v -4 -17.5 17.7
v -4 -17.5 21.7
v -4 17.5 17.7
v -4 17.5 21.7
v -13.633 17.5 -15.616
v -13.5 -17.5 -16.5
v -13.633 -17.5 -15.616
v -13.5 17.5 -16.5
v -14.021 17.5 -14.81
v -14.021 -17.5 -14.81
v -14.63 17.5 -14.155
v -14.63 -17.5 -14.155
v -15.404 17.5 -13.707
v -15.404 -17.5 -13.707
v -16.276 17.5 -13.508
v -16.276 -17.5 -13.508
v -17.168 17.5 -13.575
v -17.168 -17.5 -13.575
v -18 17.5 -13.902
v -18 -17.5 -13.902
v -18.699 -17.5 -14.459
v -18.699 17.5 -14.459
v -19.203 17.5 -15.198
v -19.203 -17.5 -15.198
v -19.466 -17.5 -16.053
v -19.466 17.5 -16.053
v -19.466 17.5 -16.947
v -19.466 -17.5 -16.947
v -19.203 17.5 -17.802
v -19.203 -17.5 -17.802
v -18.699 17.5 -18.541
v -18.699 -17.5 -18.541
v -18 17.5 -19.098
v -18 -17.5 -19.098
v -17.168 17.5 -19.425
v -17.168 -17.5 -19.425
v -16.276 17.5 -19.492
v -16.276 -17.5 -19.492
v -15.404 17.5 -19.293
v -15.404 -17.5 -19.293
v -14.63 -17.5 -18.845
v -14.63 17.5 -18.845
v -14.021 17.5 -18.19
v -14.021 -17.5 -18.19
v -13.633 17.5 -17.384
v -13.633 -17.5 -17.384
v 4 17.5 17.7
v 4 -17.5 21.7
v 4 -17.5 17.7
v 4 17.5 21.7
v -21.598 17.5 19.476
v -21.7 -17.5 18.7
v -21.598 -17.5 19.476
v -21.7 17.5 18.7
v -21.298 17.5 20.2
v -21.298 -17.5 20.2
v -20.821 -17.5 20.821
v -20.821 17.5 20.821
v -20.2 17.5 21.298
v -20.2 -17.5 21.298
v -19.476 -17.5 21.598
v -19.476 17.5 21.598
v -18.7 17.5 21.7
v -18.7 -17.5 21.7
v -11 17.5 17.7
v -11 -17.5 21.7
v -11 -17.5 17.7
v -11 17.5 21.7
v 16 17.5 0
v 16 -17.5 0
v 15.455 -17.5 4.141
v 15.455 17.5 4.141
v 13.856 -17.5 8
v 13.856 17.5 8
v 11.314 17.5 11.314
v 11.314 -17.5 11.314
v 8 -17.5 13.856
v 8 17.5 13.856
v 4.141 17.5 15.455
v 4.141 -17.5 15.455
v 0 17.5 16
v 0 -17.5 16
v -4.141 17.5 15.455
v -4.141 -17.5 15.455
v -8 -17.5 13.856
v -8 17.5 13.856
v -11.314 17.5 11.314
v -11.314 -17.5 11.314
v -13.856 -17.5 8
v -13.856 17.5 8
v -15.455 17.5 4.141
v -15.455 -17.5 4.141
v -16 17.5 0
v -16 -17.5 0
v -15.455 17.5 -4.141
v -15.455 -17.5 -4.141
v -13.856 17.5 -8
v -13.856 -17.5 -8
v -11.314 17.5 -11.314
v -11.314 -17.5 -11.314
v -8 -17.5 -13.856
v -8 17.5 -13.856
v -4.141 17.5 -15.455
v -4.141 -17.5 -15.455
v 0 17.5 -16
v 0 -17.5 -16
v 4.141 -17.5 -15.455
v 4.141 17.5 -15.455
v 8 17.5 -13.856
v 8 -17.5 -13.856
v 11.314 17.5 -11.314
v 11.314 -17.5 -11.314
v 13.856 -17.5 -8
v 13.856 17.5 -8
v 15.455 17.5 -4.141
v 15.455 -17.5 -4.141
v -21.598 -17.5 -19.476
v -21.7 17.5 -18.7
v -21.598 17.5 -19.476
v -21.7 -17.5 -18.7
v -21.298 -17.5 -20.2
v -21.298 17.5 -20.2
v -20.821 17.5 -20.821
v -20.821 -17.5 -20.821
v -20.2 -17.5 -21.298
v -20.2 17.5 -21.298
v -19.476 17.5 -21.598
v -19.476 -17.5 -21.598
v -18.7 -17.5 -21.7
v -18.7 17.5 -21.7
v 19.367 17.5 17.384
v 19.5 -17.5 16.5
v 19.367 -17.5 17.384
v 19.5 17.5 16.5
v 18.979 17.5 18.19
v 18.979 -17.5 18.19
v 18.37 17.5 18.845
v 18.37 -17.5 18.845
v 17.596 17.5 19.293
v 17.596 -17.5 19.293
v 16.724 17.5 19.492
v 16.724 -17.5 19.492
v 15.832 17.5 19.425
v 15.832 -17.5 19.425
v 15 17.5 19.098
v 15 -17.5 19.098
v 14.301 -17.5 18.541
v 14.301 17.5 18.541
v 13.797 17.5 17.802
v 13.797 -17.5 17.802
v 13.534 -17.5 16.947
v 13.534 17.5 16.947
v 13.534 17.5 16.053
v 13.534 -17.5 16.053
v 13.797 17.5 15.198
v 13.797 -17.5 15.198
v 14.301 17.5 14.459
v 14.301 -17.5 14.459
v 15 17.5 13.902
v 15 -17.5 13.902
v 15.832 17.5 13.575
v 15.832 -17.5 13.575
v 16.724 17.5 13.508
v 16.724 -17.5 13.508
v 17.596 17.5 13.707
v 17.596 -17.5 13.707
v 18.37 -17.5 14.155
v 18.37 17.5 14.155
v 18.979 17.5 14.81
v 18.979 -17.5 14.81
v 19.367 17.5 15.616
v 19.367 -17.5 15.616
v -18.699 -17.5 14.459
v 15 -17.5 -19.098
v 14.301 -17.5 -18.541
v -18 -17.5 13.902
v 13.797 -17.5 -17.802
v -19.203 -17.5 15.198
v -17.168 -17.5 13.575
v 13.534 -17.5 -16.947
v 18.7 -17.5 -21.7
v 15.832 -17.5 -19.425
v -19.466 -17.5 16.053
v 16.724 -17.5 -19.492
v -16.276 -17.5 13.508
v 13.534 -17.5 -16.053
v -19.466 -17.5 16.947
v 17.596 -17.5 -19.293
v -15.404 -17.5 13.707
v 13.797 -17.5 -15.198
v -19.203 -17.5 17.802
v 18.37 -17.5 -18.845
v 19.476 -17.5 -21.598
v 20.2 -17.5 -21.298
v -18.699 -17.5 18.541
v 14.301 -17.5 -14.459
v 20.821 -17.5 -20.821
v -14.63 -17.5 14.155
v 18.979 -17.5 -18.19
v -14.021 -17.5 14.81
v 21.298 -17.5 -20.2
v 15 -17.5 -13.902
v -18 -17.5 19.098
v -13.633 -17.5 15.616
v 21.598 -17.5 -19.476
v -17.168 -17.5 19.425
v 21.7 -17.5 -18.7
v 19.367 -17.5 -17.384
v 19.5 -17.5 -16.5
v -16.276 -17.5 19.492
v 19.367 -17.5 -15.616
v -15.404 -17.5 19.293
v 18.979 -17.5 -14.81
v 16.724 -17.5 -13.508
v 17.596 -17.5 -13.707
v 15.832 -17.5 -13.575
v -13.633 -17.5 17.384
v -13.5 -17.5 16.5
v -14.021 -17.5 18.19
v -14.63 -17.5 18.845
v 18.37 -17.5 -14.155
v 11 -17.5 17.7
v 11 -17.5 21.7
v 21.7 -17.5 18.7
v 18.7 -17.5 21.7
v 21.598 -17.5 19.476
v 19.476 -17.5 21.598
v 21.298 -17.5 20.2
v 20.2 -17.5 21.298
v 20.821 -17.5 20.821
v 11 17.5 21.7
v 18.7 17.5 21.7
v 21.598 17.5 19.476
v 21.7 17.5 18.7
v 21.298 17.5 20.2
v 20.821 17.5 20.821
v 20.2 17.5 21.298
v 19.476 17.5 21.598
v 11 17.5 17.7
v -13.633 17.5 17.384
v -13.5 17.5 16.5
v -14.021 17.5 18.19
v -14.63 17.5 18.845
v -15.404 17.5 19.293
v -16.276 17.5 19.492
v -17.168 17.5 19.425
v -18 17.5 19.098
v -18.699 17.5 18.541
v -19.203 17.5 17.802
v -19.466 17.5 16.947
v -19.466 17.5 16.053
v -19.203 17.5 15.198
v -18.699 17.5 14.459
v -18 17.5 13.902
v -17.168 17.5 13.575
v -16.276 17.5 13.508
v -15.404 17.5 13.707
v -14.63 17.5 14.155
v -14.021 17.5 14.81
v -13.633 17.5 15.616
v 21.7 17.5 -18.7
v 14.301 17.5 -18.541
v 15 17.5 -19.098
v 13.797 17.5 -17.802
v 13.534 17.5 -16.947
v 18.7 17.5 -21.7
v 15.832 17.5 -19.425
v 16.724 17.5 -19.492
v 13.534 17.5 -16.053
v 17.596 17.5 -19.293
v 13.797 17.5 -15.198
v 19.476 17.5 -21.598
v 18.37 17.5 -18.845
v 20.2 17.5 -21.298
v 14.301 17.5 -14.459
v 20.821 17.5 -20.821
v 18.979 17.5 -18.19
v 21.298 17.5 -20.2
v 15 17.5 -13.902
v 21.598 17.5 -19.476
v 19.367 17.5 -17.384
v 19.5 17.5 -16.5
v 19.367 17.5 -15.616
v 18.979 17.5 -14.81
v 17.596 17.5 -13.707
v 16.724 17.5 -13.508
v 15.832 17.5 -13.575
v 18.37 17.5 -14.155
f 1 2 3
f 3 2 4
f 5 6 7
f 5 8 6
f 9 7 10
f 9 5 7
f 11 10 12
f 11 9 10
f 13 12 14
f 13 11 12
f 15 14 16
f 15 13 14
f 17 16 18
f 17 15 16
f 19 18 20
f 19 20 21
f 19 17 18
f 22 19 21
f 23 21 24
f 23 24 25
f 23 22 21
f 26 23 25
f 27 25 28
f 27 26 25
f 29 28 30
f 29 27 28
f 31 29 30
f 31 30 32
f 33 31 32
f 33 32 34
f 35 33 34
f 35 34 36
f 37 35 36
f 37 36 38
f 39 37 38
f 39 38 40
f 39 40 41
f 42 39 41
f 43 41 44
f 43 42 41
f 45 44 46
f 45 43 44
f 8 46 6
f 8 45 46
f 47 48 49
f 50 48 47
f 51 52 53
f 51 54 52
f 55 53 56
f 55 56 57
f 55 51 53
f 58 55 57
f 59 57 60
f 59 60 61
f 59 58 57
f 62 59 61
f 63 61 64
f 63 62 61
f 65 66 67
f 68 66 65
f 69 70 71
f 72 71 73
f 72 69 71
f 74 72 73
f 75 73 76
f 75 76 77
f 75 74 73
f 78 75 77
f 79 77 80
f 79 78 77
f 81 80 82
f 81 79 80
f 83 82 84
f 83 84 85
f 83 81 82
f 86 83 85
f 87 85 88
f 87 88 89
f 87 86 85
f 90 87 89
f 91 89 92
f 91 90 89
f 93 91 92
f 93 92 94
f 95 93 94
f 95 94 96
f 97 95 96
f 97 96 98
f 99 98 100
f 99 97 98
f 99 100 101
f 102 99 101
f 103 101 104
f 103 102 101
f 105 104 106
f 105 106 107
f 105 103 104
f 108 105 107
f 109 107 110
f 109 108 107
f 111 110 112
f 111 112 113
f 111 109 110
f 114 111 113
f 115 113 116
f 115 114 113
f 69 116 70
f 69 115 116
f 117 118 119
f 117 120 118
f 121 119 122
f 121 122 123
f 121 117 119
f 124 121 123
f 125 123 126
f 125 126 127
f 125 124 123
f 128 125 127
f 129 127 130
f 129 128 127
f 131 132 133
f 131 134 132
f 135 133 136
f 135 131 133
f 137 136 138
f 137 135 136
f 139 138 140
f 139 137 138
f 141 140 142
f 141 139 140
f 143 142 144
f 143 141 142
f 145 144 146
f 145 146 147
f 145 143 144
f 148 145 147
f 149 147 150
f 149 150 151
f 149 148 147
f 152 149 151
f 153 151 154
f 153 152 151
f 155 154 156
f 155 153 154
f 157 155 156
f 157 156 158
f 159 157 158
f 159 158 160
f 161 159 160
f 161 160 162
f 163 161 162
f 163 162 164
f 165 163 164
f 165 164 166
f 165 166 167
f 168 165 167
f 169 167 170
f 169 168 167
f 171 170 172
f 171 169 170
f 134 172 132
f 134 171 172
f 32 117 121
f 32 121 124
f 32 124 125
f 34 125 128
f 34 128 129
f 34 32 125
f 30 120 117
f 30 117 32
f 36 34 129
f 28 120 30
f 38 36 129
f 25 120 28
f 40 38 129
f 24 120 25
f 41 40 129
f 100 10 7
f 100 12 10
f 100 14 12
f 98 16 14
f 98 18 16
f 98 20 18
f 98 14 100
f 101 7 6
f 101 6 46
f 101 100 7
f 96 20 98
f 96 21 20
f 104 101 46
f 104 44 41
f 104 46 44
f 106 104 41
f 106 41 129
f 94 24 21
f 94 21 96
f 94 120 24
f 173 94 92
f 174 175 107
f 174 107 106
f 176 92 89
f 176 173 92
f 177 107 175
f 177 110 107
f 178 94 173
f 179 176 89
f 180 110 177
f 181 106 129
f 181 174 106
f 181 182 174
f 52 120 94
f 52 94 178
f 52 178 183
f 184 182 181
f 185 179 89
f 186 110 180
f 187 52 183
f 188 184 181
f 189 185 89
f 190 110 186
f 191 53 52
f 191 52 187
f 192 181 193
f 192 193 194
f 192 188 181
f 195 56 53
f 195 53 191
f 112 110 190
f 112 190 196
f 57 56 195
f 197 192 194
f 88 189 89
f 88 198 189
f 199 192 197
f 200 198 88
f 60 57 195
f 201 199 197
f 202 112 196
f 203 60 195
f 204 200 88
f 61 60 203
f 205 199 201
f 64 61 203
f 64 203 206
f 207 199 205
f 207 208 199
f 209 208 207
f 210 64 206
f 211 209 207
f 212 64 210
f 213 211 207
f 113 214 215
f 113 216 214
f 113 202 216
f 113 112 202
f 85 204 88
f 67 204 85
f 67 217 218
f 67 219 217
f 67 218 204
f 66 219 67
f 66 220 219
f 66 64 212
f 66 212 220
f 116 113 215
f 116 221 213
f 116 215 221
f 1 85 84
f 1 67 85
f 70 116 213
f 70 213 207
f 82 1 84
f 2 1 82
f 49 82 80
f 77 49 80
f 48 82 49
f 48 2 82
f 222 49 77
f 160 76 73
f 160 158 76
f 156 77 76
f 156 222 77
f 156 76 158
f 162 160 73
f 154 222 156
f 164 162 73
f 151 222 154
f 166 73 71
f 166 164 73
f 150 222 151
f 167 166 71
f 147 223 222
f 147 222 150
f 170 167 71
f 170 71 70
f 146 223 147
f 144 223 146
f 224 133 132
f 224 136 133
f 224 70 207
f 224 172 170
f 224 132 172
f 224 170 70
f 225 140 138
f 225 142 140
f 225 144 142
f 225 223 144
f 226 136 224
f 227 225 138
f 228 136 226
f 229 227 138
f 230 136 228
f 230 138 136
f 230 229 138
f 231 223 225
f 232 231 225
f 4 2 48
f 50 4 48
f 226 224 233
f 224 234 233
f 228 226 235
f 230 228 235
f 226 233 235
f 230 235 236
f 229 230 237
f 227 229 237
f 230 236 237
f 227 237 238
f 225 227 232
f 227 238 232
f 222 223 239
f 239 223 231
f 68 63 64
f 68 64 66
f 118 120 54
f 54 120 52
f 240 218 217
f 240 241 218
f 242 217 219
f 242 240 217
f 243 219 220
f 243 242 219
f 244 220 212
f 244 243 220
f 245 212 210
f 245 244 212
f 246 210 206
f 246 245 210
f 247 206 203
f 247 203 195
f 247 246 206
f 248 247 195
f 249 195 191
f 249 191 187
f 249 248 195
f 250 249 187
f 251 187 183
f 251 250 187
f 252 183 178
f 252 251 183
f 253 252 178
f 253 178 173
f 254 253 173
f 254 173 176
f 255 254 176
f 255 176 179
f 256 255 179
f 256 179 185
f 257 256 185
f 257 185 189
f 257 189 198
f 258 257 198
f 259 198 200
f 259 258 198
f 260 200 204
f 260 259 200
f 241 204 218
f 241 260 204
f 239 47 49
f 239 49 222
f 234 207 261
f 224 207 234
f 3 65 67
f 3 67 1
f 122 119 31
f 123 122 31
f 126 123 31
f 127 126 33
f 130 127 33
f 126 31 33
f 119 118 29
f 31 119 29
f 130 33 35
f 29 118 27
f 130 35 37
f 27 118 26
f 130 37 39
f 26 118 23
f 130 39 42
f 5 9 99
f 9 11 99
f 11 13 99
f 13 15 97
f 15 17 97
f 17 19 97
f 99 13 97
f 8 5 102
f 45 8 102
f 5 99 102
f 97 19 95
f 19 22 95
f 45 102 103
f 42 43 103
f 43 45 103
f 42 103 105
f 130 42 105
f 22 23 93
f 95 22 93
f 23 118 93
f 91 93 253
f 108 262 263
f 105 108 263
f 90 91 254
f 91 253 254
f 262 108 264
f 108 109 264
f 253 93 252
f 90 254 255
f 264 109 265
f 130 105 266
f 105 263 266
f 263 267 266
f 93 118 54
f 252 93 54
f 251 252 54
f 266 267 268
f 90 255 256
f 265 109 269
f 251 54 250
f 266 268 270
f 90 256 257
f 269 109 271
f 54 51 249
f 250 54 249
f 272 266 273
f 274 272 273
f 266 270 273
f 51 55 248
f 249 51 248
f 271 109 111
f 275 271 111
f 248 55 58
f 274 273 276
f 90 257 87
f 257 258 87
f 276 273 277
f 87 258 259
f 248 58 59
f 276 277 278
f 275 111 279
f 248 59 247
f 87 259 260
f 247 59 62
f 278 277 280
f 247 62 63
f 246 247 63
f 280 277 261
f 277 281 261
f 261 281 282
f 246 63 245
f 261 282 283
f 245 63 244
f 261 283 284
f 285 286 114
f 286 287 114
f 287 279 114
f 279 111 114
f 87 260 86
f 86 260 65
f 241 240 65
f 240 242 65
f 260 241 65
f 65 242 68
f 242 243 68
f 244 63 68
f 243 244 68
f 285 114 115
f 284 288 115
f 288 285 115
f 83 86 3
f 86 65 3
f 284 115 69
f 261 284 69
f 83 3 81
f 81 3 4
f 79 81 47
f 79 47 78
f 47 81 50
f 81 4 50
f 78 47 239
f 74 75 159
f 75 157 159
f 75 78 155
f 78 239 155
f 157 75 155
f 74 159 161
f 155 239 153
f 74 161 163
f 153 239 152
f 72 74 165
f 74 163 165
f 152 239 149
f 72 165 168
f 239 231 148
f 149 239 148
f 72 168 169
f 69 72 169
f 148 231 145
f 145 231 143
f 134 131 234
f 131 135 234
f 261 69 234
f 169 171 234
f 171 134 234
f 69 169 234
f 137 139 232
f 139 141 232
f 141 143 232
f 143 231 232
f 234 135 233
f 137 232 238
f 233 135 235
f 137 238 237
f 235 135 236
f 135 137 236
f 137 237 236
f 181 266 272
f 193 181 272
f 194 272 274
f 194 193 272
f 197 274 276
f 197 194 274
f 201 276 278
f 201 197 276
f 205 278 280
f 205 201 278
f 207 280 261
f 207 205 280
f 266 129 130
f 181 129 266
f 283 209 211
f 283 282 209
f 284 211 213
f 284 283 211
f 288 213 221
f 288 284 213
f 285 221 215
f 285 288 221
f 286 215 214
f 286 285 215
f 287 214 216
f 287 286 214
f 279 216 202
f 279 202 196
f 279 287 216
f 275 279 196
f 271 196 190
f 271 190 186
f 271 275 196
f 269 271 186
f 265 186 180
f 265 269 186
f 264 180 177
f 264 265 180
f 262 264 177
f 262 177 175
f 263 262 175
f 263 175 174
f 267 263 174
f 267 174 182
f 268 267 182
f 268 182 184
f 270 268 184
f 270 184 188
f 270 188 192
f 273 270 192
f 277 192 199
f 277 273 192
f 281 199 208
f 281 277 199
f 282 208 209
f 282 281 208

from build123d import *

# Parameters (mm, degrees)
F0_W     = 43.4
F0_H     = 43.4
F0_R     = 3
F0_R_2   = 16
F1_DEPTH = 17.5
F2_W     = 7
F2_H     = 35
F3_DEPTH = 4
F4_R     = 3


with BuildPart() as f1:
    # F0 (on Front) → F1 (new body, symmetric)
    with BuildSketch(Plane.XZ):
        Rectangle(F0_W, F0_H)
        with Locations((-16.5, -16.5)):
            Circle(F0_R, mode=Mode.SUBTRACT)
        with Locations((16.5, -16.5)):
            Circle(F0_R, mode=Mode.SUBTRACT)
        with Locations((-16.5, 16.5)):
            Circle(F0_R, mode=Mode.SUBTRACT)
        Circle(F0_R_2, mode=Mode.SUBTRACT)
        with Locations((16.5, 16.5)):
            Circle(F0_R, mode=Mode.SUBTRACT)
    extrude(amount=F1_DEPTH, both=True)

    # F2 (on face) → F3 (cut)
    with BuildSketch(Plane.XY.offset(21.7)):
        with Locations((-7.5, 0)):
            Rectangle(F2_W, F2_H)
        with Locations((7.5, 0)):
            Rectangle(F2_W, F2_H)
    extrude(amount=-F3_DEPTH, mode=Mode.SUBTRACT)

    # F4
    f4_edges = [f1.edges().sort_by_distance(p)[0] for p in [
        (-21.7, 0, 21.7),
        (21.7, 0, 21.7),
        (21.7, 0, -21.7),
        (-21.7, 0, -21.7),
    ]]
    fillet(f4_edges, radius=F4_R)


solid = f1.part
